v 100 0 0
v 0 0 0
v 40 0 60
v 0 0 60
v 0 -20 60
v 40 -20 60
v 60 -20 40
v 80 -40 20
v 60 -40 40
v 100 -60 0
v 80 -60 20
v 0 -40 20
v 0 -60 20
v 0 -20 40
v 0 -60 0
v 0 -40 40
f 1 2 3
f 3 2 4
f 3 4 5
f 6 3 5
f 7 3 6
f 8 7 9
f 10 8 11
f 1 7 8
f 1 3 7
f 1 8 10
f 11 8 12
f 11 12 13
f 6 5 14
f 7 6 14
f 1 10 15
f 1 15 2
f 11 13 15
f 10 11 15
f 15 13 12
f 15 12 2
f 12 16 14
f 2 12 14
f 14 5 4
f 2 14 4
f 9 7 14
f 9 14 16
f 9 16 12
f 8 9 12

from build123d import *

# Parameters (mm, degrees)
F1_DEPTH    = 110
F2_T1_DEPTH = 380.0356183152


# Not quite as in the source:
# - a fillet or chamfer that OpenCascade refuses, or shapes differently, is made with other operations: its cross-section is extruded or revolved along the edge and cut away or added


with BuildPart() as f1:
    # F0 (on Right) → F1 (new body)
    with BuildSketch(Plane.YZ):
        Polygon((-60, 0), (0, 0), (0, 60), (-20, 60), (-20, 40), (-40, 40), (-40, 20), (-60, 20), align=None)
    extrude(amount=F1_DEPTH)

    # F2: chamfer of 70 on 1 edges, made by hand

    # F2_s2 → F2_t1 (cut)
    with BuildSketch(Plane.XZ.offset(-180.0178091576)):
        Polygon((40, 60), (110, -10), (110, 60), align=None)
    extrude(amount=F2_T1_DEPTH, mode=Mode.SUBTRACT)


solid = f1.part
